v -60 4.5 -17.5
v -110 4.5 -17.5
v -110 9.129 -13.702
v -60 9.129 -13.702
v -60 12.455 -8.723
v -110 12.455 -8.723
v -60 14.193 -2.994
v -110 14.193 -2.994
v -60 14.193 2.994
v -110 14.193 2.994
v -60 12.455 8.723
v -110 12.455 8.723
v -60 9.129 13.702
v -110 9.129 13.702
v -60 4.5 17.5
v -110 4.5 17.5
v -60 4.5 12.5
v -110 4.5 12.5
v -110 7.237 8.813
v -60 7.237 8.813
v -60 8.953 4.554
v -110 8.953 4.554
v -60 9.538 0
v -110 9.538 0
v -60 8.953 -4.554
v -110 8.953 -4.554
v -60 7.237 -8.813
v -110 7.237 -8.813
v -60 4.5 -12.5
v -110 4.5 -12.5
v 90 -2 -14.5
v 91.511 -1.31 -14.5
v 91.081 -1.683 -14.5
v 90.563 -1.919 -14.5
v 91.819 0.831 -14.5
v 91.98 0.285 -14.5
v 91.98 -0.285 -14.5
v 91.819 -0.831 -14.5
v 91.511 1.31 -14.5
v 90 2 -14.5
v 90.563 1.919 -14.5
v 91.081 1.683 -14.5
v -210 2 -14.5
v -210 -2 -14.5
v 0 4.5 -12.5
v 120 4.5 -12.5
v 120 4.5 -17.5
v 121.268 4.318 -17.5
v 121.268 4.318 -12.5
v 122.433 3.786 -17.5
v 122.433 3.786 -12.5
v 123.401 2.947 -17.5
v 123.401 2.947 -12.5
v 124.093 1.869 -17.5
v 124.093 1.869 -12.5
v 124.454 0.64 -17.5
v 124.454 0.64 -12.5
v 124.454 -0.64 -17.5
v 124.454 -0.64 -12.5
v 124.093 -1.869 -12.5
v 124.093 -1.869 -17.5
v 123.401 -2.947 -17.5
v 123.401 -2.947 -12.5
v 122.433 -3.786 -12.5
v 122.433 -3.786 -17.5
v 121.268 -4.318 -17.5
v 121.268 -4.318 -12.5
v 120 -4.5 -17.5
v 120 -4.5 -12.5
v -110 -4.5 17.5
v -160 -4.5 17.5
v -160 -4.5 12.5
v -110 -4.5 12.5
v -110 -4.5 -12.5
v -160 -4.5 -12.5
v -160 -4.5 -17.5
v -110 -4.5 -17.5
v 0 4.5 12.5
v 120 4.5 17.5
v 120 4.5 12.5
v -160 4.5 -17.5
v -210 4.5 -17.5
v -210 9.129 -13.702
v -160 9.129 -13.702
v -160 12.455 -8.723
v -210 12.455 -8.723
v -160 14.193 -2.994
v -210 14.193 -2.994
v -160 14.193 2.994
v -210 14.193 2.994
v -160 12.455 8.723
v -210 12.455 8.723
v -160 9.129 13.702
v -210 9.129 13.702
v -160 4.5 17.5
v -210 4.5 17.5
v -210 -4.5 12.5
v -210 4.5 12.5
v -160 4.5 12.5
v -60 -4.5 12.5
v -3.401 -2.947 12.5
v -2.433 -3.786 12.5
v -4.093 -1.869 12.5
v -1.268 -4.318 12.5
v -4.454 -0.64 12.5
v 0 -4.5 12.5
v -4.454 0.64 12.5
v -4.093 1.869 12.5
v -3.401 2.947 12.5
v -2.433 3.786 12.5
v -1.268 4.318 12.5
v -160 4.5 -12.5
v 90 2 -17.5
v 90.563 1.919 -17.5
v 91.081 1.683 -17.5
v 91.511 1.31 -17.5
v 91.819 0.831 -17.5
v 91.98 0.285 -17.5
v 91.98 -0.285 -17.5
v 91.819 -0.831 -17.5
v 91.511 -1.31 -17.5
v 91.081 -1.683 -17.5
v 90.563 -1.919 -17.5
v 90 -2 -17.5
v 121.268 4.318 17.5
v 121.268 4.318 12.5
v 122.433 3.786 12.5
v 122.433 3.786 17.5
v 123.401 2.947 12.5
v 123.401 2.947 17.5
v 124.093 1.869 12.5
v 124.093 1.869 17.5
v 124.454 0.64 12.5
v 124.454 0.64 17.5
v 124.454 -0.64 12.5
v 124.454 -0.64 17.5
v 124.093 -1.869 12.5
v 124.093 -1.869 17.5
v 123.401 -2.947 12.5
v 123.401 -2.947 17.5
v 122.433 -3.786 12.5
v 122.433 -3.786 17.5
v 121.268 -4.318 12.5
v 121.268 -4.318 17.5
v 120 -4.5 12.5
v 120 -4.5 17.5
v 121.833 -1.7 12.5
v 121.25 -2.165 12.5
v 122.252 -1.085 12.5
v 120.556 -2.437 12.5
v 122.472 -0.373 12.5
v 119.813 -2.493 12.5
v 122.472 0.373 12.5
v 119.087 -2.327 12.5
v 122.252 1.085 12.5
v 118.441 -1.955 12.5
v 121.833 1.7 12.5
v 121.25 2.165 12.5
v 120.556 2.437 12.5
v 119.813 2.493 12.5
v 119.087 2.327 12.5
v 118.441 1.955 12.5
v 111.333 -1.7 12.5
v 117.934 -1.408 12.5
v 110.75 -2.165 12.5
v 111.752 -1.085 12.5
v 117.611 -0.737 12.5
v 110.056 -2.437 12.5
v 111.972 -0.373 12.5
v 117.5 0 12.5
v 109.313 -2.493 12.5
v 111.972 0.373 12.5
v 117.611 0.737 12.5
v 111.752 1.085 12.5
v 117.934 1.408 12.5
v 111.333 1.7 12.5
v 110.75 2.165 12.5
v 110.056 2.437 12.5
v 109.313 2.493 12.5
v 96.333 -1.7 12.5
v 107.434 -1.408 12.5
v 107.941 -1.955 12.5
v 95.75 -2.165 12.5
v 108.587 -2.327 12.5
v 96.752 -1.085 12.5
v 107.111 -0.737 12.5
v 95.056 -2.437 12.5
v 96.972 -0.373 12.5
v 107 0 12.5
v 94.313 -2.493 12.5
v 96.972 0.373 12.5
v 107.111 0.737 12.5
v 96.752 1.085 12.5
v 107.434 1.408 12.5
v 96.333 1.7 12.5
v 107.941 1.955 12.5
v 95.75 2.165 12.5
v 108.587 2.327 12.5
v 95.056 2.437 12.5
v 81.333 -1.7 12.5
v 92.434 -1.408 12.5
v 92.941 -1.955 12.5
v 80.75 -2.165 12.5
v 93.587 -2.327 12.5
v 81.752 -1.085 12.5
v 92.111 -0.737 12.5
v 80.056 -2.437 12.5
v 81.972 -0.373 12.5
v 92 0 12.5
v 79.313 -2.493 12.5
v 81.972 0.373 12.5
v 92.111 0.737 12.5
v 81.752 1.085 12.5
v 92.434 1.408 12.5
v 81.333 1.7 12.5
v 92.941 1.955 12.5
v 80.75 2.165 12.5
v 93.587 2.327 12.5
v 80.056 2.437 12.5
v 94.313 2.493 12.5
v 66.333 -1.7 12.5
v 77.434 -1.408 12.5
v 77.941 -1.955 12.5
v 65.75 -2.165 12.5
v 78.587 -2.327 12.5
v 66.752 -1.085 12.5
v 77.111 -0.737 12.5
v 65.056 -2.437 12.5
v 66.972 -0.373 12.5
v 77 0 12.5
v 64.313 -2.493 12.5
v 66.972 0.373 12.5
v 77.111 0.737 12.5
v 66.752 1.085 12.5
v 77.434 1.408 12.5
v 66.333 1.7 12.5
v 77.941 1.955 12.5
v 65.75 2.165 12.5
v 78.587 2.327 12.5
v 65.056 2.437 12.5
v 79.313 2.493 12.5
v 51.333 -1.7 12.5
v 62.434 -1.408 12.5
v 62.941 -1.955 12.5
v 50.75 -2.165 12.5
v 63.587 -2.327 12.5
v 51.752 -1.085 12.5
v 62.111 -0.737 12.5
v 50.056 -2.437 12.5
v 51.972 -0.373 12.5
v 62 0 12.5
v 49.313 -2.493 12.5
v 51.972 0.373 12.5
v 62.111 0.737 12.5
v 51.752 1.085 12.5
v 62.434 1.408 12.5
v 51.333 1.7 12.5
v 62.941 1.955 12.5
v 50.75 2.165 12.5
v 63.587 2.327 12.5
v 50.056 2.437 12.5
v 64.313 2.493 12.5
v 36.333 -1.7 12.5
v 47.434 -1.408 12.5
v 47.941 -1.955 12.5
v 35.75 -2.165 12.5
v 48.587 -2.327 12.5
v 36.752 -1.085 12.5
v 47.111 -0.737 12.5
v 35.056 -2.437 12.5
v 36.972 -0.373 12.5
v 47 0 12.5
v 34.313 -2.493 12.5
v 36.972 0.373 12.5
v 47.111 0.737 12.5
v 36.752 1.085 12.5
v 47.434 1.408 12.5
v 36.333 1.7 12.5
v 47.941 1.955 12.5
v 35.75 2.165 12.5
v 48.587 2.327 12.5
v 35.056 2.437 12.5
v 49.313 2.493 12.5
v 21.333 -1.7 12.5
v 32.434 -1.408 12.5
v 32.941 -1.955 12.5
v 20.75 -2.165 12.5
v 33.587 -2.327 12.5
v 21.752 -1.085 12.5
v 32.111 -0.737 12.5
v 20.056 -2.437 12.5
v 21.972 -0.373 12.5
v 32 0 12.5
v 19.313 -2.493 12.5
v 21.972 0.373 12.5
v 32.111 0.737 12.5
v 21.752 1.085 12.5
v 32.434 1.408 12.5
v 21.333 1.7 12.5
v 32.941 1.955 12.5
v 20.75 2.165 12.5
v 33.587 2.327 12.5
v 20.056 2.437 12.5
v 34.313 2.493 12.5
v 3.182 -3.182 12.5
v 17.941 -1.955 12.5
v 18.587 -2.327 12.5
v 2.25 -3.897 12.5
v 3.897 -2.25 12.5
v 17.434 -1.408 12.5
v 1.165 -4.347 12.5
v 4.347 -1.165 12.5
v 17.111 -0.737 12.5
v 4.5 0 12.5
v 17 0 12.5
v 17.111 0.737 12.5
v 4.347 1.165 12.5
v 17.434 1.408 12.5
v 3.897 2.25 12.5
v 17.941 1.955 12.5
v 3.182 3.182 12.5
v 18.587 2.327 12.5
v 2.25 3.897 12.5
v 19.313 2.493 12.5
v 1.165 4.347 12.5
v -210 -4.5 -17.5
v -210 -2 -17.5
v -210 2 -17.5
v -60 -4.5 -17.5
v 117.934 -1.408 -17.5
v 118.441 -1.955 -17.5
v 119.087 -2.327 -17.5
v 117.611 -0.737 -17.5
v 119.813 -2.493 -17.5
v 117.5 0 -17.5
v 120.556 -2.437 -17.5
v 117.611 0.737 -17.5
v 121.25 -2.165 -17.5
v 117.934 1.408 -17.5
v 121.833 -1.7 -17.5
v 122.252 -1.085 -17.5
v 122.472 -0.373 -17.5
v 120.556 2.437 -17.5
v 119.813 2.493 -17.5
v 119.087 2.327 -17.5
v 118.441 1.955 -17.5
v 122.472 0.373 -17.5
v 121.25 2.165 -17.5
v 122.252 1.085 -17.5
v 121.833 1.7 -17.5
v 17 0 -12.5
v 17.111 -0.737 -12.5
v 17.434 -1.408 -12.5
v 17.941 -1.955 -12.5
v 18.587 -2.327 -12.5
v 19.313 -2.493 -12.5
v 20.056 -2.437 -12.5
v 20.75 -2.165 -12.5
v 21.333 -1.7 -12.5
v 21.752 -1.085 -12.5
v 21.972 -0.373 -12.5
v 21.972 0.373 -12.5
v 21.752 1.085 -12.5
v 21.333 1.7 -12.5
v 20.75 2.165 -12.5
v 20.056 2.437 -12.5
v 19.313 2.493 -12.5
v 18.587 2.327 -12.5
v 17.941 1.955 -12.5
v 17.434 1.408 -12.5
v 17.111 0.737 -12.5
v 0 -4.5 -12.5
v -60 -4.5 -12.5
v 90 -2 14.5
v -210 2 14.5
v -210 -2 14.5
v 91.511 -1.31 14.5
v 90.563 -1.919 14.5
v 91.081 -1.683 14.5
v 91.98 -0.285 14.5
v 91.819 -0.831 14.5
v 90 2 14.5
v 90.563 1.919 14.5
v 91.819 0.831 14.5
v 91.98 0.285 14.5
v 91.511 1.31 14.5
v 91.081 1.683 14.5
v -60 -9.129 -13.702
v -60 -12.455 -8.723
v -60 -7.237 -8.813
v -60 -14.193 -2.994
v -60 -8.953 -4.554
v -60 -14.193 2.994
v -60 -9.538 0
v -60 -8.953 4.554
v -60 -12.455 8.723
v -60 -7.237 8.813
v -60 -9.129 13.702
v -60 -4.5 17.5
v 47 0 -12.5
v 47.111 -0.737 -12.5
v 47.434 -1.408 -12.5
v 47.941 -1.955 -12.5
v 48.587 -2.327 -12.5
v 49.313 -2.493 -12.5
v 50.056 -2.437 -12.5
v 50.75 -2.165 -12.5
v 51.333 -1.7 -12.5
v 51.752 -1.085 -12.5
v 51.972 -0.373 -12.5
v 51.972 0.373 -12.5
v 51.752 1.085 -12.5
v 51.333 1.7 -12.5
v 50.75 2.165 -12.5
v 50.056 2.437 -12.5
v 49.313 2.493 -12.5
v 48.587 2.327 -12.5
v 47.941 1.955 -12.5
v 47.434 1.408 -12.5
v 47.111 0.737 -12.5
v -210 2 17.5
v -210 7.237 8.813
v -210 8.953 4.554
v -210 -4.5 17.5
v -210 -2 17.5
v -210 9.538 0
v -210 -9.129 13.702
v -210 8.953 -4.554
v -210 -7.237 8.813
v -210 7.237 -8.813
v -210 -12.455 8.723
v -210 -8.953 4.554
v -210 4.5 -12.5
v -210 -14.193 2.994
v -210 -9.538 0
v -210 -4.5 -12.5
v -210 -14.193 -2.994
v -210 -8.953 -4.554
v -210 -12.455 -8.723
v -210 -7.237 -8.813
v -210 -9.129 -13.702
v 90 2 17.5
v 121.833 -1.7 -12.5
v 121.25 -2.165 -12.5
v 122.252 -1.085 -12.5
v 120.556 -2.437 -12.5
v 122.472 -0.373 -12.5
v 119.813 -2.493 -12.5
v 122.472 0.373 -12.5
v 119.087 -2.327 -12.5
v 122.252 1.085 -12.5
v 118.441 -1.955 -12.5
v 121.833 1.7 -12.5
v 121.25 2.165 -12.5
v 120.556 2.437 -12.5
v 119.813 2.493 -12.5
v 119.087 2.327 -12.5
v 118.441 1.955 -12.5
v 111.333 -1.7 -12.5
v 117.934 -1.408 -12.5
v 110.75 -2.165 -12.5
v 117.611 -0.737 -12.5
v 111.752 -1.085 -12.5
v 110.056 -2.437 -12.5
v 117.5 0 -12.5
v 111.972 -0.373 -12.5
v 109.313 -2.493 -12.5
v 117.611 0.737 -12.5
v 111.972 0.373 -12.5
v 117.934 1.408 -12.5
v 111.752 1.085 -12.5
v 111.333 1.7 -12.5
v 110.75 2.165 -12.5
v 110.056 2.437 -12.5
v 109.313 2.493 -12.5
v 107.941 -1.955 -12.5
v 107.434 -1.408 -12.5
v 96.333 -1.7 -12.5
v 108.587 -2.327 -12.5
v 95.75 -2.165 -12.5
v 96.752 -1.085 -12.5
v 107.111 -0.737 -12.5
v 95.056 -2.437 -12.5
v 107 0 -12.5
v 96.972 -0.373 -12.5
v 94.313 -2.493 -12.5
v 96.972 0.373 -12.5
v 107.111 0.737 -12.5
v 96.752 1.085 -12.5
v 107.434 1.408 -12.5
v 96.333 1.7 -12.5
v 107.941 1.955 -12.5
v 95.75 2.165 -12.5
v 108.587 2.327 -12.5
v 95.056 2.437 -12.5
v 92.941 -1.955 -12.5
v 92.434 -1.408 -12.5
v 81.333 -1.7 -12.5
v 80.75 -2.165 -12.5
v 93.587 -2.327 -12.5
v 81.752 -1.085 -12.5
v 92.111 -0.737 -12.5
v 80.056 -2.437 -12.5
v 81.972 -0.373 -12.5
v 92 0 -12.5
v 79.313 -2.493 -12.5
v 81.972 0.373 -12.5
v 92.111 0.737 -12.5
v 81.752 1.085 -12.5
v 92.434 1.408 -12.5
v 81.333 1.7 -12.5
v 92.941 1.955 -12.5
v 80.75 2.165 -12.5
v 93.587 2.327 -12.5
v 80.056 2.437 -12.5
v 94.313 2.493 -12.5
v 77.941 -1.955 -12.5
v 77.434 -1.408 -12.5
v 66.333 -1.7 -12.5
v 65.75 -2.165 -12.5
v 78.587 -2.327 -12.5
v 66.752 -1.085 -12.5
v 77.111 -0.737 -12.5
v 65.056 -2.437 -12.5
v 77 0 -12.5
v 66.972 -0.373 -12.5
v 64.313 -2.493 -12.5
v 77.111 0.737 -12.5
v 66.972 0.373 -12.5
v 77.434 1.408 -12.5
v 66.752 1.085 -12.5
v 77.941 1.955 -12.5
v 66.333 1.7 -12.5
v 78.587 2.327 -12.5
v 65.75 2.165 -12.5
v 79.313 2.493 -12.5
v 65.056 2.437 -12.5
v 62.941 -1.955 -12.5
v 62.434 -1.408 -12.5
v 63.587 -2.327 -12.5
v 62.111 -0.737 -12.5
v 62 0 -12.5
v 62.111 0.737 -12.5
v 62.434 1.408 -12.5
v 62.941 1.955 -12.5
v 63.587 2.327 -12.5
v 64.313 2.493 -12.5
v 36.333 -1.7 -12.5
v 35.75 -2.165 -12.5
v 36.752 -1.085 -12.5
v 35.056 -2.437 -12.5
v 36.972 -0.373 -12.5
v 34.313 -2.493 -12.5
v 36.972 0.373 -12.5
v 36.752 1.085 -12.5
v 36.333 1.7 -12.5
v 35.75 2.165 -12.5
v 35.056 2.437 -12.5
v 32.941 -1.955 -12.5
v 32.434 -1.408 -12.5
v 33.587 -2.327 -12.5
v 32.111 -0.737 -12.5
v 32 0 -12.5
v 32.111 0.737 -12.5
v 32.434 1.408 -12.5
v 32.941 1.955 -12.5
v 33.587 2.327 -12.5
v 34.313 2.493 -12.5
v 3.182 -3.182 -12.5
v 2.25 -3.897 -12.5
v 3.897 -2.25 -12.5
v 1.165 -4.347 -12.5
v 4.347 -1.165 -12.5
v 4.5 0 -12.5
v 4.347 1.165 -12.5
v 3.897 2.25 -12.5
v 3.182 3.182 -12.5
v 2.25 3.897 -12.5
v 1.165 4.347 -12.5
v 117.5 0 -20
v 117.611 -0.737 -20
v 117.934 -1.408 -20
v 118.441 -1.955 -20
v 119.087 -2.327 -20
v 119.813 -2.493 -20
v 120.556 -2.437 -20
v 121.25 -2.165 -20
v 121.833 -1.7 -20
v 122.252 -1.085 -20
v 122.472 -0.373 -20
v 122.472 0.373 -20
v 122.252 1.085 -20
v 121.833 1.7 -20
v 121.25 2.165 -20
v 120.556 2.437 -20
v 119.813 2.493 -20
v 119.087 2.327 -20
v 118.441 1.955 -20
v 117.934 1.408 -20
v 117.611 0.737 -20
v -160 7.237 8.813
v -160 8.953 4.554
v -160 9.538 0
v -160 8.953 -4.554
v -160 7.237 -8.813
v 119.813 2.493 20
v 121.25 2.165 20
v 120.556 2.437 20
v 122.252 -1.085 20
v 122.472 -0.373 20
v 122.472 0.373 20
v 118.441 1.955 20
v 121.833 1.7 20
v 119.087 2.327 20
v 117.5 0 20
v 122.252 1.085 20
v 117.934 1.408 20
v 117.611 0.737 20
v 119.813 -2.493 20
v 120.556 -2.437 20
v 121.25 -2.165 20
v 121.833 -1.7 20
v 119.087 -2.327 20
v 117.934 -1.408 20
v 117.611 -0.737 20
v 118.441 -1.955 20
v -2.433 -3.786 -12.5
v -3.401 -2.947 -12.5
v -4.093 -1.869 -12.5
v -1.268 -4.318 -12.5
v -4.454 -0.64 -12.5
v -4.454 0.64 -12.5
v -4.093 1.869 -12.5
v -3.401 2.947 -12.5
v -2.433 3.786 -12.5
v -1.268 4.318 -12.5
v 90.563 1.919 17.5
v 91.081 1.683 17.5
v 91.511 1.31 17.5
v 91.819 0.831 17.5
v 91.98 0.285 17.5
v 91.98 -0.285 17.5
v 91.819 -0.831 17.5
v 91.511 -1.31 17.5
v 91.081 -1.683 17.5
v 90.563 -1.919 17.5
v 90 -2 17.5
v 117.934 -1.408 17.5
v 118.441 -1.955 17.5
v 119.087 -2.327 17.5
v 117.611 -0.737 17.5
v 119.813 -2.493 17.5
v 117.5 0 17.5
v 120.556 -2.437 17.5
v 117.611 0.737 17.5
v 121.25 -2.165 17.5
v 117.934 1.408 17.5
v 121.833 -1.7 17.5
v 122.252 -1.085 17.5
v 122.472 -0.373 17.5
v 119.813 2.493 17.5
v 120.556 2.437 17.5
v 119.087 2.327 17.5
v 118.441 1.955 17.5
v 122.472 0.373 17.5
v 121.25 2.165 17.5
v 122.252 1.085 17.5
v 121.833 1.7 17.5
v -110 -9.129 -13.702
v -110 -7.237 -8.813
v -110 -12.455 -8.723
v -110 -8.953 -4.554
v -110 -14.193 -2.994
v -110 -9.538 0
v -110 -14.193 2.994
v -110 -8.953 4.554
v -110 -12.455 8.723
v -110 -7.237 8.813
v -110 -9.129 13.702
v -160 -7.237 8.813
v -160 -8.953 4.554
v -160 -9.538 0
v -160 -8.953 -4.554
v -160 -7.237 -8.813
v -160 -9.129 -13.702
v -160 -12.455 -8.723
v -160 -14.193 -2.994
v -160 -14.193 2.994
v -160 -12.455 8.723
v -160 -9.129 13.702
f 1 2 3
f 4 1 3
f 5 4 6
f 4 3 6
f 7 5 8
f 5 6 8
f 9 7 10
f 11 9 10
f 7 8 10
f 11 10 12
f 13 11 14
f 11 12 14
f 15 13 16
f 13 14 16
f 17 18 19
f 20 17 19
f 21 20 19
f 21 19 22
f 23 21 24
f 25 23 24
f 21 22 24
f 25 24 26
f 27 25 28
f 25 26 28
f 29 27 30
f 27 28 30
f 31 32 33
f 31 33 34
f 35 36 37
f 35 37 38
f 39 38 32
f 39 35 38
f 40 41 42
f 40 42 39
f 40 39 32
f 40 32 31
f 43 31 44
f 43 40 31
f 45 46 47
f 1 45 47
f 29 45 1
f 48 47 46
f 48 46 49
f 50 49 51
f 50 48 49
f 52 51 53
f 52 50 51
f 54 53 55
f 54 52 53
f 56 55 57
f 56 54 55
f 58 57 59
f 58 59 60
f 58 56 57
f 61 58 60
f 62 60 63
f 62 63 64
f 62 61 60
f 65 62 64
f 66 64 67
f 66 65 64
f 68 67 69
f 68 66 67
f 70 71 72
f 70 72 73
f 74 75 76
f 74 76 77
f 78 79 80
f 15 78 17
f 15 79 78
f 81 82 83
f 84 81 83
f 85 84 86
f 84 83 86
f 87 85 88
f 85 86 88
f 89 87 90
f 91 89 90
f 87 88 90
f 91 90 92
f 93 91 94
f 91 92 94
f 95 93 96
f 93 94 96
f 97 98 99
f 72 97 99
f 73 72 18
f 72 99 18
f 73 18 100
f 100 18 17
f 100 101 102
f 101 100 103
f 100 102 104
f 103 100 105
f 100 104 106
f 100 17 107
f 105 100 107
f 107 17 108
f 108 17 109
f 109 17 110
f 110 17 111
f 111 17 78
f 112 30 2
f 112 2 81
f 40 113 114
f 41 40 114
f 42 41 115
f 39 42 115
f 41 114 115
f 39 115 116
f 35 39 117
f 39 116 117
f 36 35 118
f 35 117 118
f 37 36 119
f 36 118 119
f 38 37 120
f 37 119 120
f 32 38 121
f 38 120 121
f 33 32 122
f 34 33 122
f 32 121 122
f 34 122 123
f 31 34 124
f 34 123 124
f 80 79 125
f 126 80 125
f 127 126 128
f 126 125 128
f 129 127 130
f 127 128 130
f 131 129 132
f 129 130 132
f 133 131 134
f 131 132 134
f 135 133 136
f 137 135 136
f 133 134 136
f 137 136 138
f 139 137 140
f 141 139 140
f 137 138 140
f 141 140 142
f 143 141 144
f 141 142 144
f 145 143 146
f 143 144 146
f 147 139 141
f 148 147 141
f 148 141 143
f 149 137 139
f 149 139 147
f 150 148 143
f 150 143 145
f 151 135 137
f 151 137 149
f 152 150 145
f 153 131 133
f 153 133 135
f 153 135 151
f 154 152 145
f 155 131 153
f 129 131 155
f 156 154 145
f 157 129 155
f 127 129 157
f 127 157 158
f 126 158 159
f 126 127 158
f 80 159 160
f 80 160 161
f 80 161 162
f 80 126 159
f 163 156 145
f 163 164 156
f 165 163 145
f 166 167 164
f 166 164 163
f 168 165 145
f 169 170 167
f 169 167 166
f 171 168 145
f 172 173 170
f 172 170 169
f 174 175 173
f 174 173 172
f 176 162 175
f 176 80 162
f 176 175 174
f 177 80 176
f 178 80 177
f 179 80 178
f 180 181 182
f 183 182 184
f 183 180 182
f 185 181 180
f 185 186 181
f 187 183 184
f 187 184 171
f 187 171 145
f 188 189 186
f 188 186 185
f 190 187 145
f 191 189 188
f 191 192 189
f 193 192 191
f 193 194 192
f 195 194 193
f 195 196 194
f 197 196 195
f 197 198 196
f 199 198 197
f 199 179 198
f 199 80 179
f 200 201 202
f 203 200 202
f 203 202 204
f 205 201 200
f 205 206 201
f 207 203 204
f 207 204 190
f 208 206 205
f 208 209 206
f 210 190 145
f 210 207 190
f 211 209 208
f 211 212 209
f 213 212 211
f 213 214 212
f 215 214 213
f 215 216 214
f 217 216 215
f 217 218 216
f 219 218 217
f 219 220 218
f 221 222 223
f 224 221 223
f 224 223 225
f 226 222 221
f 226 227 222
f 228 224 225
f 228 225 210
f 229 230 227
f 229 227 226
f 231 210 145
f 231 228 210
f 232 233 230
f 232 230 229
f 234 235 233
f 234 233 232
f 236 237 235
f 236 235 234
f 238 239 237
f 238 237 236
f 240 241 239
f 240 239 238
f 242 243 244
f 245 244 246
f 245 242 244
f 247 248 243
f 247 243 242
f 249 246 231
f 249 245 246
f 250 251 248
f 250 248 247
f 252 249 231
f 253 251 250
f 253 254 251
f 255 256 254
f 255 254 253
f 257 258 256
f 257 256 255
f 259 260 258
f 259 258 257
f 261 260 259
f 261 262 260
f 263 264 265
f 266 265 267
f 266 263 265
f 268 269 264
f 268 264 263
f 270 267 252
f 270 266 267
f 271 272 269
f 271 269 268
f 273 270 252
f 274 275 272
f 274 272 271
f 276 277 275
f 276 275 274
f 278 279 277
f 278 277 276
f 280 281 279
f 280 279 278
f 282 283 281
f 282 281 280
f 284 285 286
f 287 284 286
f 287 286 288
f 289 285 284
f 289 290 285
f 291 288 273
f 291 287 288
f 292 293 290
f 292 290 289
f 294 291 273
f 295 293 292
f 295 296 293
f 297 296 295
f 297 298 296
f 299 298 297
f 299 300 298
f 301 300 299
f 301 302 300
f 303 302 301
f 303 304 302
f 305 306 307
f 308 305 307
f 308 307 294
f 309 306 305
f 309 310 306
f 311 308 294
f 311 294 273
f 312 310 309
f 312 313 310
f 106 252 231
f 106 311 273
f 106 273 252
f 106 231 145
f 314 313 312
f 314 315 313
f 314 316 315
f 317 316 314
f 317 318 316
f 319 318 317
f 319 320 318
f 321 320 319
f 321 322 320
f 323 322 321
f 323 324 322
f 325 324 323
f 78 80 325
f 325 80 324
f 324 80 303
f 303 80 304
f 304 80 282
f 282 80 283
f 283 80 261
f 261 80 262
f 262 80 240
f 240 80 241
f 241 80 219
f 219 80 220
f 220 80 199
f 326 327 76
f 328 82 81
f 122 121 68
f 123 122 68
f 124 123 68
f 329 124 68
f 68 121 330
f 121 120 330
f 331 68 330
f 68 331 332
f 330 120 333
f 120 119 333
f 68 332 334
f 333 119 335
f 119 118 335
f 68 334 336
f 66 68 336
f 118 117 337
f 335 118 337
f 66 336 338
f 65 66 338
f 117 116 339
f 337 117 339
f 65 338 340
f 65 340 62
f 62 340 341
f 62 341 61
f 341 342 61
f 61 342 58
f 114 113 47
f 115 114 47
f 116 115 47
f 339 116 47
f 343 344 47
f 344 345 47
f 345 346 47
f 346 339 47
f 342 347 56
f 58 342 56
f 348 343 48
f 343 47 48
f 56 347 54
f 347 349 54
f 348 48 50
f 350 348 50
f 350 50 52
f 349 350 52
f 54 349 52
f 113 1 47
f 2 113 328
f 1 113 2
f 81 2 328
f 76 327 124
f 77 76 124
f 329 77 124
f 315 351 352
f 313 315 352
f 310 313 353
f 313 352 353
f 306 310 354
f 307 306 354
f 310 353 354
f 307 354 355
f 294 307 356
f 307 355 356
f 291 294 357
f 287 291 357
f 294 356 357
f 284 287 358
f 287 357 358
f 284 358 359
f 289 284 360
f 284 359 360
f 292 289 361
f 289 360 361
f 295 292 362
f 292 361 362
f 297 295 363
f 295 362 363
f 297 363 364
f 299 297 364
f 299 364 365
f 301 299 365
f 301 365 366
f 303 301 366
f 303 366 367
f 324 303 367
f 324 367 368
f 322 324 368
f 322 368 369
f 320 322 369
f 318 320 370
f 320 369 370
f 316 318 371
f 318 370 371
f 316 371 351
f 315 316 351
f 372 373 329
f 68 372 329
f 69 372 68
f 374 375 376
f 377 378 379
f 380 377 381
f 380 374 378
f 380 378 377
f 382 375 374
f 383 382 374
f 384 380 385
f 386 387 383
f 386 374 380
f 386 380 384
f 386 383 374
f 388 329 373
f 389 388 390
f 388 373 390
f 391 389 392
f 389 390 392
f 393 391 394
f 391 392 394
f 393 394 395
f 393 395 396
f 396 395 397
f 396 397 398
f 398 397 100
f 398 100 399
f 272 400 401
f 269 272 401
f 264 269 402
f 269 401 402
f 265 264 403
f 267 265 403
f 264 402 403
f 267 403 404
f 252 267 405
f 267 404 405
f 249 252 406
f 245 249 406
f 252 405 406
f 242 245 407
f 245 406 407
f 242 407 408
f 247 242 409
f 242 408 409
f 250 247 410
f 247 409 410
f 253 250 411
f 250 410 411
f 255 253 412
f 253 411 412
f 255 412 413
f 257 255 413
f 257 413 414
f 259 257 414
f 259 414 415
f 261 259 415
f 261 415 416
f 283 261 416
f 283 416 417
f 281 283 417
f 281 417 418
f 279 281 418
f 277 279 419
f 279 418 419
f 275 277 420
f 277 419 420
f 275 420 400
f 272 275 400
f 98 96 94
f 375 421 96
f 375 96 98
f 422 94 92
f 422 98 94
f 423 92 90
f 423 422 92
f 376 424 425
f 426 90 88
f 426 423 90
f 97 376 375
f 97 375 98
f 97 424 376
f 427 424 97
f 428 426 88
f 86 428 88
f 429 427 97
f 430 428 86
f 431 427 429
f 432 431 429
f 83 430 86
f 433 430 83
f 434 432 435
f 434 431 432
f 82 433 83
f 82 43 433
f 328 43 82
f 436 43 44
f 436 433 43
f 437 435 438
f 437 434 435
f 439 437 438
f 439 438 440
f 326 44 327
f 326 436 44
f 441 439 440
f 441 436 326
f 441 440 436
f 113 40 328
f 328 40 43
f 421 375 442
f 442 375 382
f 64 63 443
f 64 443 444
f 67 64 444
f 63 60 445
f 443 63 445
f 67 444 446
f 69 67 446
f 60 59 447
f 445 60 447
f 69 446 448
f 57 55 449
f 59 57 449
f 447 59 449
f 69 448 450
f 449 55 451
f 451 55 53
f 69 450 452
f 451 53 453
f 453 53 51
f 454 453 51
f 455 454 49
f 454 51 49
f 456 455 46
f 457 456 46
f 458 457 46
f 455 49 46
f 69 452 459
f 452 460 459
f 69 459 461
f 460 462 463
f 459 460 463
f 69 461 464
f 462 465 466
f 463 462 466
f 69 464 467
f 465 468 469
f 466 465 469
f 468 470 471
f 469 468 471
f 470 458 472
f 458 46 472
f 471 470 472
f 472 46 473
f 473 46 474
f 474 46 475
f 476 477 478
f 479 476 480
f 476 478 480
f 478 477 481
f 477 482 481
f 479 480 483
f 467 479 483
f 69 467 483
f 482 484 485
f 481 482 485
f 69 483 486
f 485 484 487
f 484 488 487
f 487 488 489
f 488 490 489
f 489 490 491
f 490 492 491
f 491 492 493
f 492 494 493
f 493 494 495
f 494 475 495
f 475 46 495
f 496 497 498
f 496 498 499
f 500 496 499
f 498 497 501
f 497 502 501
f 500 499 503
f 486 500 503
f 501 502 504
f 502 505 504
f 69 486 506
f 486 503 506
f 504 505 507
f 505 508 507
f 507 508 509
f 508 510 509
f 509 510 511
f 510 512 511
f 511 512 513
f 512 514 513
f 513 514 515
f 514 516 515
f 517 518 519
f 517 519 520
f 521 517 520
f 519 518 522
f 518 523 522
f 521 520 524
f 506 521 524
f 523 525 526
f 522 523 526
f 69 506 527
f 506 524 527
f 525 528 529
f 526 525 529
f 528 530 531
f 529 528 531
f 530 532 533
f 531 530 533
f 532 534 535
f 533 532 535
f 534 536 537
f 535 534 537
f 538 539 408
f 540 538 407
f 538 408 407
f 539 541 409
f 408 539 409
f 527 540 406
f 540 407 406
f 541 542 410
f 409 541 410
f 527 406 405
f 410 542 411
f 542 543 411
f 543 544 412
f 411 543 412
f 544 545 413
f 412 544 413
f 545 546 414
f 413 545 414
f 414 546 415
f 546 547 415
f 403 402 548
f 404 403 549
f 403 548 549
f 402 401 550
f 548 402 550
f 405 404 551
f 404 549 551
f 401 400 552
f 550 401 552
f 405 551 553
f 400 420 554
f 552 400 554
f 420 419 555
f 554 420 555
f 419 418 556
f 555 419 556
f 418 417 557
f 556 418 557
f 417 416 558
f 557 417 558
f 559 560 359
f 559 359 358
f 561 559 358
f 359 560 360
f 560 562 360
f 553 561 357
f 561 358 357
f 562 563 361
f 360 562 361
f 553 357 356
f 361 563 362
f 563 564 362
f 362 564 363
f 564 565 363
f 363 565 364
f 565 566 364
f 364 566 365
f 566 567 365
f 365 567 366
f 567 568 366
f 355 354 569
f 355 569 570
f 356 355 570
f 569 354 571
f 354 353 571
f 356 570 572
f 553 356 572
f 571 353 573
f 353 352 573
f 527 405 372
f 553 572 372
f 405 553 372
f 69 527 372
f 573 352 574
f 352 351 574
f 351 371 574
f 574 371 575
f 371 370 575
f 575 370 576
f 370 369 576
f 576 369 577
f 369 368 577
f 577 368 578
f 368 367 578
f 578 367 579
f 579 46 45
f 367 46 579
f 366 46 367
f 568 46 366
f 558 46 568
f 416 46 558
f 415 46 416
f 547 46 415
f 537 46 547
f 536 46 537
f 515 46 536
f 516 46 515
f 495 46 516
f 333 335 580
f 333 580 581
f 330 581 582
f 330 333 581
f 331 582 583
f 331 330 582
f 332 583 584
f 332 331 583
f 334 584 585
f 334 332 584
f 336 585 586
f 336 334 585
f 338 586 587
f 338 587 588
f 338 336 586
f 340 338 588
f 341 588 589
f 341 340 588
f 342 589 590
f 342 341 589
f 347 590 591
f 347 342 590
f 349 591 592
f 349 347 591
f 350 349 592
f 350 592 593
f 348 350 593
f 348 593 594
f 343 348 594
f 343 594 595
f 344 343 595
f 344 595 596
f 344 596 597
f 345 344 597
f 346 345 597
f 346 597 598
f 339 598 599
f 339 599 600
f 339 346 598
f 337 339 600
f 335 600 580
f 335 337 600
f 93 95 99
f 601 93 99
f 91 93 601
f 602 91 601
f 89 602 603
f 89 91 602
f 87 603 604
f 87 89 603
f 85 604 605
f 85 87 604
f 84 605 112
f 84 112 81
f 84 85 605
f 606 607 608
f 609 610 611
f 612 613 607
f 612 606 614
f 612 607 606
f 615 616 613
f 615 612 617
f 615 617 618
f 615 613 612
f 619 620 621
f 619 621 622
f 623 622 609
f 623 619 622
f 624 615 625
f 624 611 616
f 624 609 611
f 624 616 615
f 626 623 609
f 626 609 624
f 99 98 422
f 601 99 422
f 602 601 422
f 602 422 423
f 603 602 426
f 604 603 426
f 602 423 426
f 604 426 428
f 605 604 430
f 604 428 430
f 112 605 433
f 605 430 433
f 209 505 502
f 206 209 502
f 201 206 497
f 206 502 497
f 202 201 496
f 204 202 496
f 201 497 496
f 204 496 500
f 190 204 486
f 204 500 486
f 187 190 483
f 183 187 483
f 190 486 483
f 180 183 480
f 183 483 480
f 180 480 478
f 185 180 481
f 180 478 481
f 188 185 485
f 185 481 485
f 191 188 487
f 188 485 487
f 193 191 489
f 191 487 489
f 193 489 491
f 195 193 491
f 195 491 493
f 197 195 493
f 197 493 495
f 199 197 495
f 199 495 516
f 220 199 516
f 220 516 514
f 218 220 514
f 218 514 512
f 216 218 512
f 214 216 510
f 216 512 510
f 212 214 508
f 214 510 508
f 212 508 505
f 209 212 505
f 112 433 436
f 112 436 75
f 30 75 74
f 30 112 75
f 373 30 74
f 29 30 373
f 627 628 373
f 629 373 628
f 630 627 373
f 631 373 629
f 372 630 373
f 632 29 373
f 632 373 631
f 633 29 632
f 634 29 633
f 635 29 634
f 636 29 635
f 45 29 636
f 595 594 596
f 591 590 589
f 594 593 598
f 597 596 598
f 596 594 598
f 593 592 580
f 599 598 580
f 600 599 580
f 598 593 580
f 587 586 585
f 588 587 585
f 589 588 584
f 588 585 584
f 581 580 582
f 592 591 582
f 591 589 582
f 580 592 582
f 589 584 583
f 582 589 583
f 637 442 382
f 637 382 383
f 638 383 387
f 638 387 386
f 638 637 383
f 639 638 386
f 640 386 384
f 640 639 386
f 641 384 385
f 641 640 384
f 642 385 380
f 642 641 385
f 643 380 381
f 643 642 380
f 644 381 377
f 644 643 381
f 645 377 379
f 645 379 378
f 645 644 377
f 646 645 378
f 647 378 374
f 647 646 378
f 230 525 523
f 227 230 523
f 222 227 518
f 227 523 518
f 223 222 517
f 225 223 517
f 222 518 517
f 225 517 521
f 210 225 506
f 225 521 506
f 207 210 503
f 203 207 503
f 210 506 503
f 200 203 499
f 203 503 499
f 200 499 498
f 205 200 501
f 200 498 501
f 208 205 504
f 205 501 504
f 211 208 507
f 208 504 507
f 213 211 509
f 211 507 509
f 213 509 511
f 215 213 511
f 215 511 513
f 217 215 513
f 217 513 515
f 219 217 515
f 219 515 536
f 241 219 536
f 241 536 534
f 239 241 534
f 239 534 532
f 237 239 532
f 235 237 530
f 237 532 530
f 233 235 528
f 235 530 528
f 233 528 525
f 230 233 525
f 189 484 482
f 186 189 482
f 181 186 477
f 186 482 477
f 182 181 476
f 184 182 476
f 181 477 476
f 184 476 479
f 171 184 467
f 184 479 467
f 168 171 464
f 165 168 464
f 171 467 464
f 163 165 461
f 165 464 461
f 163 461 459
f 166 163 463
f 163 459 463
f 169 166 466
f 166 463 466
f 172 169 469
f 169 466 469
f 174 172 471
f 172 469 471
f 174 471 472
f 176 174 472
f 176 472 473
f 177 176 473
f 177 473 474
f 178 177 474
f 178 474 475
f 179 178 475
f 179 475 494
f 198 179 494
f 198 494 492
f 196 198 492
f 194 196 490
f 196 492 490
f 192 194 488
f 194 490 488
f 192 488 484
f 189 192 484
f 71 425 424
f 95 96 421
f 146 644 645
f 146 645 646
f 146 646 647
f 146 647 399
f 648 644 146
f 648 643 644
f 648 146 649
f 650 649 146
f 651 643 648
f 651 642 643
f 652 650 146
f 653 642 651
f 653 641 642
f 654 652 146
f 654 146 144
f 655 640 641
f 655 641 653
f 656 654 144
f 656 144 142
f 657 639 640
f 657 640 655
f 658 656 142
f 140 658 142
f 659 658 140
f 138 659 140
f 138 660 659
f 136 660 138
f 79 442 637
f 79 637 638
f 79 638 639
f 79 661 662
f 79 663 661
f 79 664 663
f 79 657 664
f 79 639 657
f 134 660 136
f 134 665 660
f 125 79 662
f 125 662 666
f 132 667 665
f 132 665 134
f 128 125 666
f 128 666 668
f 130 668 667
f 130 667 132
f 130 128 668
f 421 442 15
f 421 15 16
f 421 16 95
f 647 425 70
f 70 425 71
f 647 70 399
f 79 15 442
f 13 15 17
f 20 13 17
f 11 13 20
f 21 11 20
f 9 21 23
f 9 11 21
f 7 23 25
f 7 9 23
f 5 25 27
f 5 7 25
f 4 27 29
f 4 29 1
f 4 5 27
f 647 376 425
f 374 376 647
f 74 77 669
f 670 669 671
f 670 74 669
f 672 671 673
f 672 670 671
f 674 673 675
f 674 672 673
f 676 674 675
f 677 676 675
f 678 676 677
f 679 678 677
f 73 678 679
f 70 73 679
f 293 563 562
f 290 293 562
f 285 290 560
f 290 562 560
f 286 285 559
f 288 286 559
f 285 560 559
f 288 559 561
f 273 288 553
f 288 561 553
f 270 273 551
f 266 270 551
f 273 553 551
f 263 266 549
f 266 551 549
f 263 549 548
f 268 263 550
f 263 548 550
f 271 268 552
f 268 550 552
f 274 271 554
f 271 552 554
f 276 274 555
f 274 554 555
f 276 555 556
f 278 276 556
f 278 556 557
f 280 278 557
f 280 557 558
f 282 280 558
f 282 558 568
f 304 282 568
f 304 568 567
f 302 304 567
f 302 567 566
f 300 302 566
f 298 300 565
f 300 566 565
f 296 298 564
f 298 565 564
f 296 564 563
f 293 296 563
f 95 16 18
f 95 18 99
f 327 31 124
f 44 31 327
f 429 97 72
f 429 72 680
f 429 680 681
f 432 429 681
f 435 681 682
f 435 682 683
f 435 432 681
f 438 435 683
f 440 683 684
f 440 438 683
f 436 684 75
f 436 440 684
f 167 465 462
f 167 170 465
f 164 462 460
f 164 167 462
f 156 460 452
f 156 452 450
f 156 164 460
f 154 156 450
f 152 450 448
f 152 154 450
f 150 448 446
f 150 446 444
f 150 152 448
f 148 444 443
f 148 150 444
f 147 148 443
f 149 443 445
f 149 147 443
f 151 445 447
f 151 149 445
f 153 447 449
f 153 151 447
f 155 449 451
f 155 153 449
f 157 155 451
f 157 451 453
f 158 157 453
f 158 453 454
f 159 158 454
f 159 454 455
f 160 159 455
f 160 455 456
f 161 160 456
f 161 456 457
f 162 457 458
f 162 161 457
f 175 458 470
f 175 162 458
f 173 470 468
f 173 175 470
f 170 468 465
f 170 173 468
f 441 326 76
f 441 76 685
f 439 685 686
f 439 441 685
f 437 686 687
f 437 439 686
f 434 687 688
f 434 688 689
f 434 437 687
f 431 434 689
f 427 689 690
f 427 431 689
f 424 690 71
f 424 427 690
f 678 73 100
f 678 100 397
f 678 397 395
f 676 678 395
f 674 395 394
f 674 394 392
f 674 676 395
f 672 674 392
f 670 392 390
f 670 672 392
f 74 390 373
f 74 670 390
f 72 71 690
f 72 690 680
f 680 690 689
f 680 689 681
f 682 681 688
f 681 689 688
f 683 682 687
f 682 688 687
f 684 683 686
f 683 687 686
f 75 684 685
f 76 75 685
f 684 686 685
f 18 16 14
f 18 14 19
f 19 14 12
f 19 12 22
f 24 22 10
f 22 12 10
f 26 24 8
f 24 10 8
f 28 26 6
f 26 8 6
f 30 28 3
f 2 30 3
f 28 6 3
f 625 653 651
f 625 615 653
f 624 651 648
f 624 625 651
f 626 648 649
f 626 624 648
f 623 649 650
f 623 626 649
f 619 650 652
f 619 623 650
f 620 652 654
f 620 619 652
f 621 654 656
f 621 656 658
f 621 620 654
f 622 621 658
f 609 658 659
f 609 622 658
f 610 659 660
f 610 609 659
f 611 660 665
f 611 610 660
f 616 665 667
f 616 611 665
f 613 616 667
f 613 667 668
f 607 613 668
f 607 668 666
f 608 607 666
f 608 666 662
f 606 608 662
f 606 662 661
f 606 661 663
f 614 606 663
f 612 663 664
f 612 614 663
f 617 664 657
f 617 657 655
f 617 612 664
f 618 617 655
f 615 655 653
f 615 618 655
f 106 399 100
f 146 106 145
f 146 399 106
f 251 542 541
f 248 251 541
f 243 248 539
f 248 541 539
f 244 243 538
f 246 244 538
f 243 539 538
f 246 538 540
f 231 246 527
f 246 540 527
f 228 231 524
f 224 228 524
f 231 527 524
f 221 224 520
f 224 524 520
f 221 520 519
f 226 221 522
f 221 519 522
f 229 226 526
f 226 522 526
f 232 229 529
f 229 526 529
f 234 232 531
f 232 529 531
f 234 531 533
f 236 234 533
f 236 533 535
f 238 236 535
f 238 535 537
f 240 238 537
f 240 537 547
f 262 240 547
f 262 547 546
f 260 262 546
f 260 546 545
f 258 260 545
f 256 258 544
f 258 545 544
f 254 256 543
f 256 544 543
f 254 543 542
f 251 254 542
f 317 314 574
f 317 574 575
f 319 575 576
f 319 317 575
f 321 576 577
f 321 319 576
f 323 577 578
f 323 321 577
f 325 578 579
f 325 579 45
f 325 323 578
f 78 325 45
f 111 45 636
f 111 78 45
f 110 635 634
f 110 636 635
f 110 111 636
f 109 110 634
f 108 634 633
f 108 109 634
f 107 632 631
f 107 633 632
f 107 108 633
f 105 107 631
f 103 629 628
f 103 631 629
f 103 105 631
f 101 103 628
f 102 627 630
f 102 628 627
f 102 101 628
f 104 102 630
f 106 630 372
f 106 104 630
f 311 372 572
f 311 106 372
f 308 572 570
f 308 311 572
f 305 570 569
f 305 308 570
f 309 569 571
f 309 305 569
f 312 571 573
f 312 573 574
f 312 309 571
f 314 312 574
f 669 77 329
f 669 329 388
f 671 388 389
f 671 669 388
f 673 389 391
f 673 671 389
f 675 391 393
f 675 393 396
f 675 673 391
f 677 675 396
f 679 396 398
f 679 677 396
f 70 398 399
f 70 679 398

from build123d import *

# Parameters (mm, degrees)
CROQUIS1_R              = 4.5
SALIENTE_EXTRUIR1_DEPTH = 12.5
SALIENTE_EXTRUIR2_START = 5
SALIENTE_EXTRUIR2_DEPTH = 5
CROQUIS4_R              = 2.5
SALIENTE_EXTRUIR3_DEPTH = 20
CORTAR_EXTRUIR1_DEPTH   = 3
SALIENTE_EXTRUIR4_START = -5
SALIENTE_EXTRUIR4_DEPTH = 5
CROQUIS7_W              = 256.925453937
CROQUIS7_H              = 4
CORTAR_EXTRUIR2_DEPTH   = 10
SALIENTE_EXTRUIR6_DEPTH = 5
CROQUIS9_W              = 256.997943919
CROQUIS9_H              = 4
CORTAR_EXTRUIR3_DEPTH   = 10
CROQUIS10_R             = 2.5
SALIENTE_EXTRUIR7_DEPTH = 25
SALIENTE_EXTRUIR9_DEPTH = 50
MATRIZL1_COUNT          = 2
MATRIZL1_PITCH          = 100
MATRIZL1_COPY_1_DEPTH   = 50


with BuildPart() as part:
    # Croquis1 → Saliente-Extruir1 (new, symmetric)
    with BuildSketch(Plane.XY):
        Circle(CROQUIS1_R)
    extrude(amount=SALIENTE_EXTRUIR1_DEPTH, both=True)

    # Croquis2 → Saliente-Extruir2 (add)
    with BuildSketch(Plane.XY.offset(12.5).offset(SALIENTE_EXTRUIR2_START)):
        with BuildLine():
            Line((0, 4.5), (120, 4.5))
            ThreePointArc((120, 4.5), (124.5, 0), (120, -4.5))
            Line((120, -4.5), (0, -4.5))
            ThreePointArc((0, -4.5), (-4.5, 0), (0, 4.5))
        make_face()
    saliente_extruir2 = extrude(amount=-SALIENTE_EXTRUIR2_DEPTH)

    # Simetría1: Saliente-Extruir2 across plane
    add(saliente_extruir2.mirror(Plane.XY))

    # Croquis4 → Saliente-Extruir3 (add, symmetric)
    with BuildSketch(Plane.XY):
        with Locations(Location((120, 0, 0), (0, 0, 180))):
            Circle(CROQUIS4_R)
    extrude(amount=SALIENTE_EXTRUIR3_DEPTH, both=True)

    # Croquis5 → Cortar-Extruir1 (cut)
    with BuildSketch(Plane.XY.offset(17.5)):
        with BuildLine():
            Line((0, 2), (90, 2))
            ThreePointArc((90, 2), (92, 0), (90, -2))
            Line((90, -2), (0, -2))
            ThreePointArc((0, -2), (-2, 0), (0, 2))
        make_face()
    cortar_extruir1 = extrude(amount=-CORTAR_EXTRUIR1_DEPTH, mode=Mode.SUBTRACT)

    # Simetría2: Cortar-Extruir1 across plane
    add(cortar_extruir1.mirror(Plane.XY), mode=Mode.SUBTRACT)

    # Croquis6 → Saliente-Extruir4 (add)
    with BuildSketch(Plane(origin=(0, 0, -17.5), x_dir=(-1, 0, 0), z_dir=(0, 0, -1)).offset(SALIENTE_EXTRUIR4_START)):
        with BuildLine():
            Line((0, 4.5), (210, 4.5))
            Line((210, 4.5), (210, -4.5))
            Line((210, -4.5), (0, -4.5))
            ThreePointArc((0, -4.5), (4.5, 0), (0, 4.5))
        make_face()
    extrude(amount=SALIENTE_EXTRUIR4_DEPTH)

    # Croquis7 → Cortar-Extruir2 (cut)
    with BuildSketch(Plane(origin=(0, 0, -14.5), x_dir=(-1, 0, 0), z_dir=(0, 0, -1))):
        with Locations((128.462726969, 0)):
            Rectangle(CROQUIS7_W, CROQUIS7_H)
    extrude(amount=CORTAR_EXTRUIR2_DEPTH, mode=Mode.SUBTRACT)

    # Croquis8 → Saliente-Extruir6 (add)
    with BuildSketch(Plane.XY.offset(17.5)):
        with BuildLine():
            Line((0, 4.5), (-210, 4.5))
            Line((-210, 4.5), (-210, -4.5))
            Line((-210, -4.5), (0, -4.5))
            ThreePointArc((0, -4.5), (-4.5, 0), (0, 4.5))
        make_face()
    extrude(amount=-SALIENTE_EXTRUIR6_DEPTH)

    # Croquis9 → Cortar-Extruir3 (cut)
    with BuildSketch(Plane.XY.offset(14.5)):
        with Locations((-128.49897196, 0)):
            Rectangle(CROQUIS9_W, CROQUIS9_H)
    extrude(amount=CORTAR_EXTRUIR3_DEPTH, mode=Mode.SUBTRACT)

    # Croquis10 → Saliente-Extruir7 (add)
    with BuildSketch(Plane.XY.offset(-12.5)):
        with Locations(Location((109.5, 0, 0), (0, 0, 180))):
            Circle(CROQUIS10_R)
        with Locations(Location((94.5, 0, 0), (0, 0, 180))):
            Circle(CROQUIS10_R)
        with Locations(Location((79.5, 0, 0), (0, 0, 180))):
            Circle(CROQUIS10_R)
        with Locations(Location((64.5, 0, 0), (0, 0, 180))):
            Circle(CROQUIS10_R)
        with Locations(Location((49.5, 0, 0), (0, 0, 180))):
            Circle(CROQUIS10_R)
        with Locations(Location((34.5, 0, 0), (0, 0, 180))):
            Circle(CROQUIS10_R)
        with Locations(Location((19.5, 0, 0), (0, 0, 180))):
            Circle(CROQUIS10_R)
    extrude(amount=SALIENTE_EXTRUIR7_DEPTH)

    # Croquis13 → Saliente-Extruir9 (add)
    with BuildSketch(Plane.ZY.offset(210)):
        with BuildLine():
            Line((17.5, 4.5), (12.5, 4.5))
            ThreePointArc((12.5, 4.5), (0, 9.538029883), (-12.5, 4.5))
            Line((-12.5, 4.5), (-17.5, 4.5))
            ThreePointArc((-17.5, 4.5), (0, 14.414141438), (17.5, 4.5))
        make_face()
    saliente_extruir9 = extrude(amount=-SALIENTE_EXTRUIR9_DEPTH)

    # Simetría3: Saliente-Extruir9 across plane
    add(saliente_extruir9.mirror(Plane.ZX))

    # MatrizL1: Saliente-Extruir9 ×2
    with Locations(*[(i * MATRIZL1_PITCH, 0, 0) for i in range(1, MATRIZL1_COUNT)]):
        add(saliente_extruir9)

    # MatrizL1 copy 1 sketch → MatrizL1 copy 1 (add)
    with BuildSketch(Plane.ZY.offset(110)):
        with BuildLine():
            Line((17.5, -4.5), (12.5, -4.5))
            ThreePointArc((12.5, -4.5), (0, -9.538029883), (-12.5, -4.5))
            Line((-12.5, -4.5), (-17.5, -4.5))
            ThreePointArc((-17.5, -4.5), (0, -14.414141438), (17.5, -4.5))
        make_face()
    extrude(amount=-MATRIZL1_COPY_1_DEPTH)


solid = part.part
